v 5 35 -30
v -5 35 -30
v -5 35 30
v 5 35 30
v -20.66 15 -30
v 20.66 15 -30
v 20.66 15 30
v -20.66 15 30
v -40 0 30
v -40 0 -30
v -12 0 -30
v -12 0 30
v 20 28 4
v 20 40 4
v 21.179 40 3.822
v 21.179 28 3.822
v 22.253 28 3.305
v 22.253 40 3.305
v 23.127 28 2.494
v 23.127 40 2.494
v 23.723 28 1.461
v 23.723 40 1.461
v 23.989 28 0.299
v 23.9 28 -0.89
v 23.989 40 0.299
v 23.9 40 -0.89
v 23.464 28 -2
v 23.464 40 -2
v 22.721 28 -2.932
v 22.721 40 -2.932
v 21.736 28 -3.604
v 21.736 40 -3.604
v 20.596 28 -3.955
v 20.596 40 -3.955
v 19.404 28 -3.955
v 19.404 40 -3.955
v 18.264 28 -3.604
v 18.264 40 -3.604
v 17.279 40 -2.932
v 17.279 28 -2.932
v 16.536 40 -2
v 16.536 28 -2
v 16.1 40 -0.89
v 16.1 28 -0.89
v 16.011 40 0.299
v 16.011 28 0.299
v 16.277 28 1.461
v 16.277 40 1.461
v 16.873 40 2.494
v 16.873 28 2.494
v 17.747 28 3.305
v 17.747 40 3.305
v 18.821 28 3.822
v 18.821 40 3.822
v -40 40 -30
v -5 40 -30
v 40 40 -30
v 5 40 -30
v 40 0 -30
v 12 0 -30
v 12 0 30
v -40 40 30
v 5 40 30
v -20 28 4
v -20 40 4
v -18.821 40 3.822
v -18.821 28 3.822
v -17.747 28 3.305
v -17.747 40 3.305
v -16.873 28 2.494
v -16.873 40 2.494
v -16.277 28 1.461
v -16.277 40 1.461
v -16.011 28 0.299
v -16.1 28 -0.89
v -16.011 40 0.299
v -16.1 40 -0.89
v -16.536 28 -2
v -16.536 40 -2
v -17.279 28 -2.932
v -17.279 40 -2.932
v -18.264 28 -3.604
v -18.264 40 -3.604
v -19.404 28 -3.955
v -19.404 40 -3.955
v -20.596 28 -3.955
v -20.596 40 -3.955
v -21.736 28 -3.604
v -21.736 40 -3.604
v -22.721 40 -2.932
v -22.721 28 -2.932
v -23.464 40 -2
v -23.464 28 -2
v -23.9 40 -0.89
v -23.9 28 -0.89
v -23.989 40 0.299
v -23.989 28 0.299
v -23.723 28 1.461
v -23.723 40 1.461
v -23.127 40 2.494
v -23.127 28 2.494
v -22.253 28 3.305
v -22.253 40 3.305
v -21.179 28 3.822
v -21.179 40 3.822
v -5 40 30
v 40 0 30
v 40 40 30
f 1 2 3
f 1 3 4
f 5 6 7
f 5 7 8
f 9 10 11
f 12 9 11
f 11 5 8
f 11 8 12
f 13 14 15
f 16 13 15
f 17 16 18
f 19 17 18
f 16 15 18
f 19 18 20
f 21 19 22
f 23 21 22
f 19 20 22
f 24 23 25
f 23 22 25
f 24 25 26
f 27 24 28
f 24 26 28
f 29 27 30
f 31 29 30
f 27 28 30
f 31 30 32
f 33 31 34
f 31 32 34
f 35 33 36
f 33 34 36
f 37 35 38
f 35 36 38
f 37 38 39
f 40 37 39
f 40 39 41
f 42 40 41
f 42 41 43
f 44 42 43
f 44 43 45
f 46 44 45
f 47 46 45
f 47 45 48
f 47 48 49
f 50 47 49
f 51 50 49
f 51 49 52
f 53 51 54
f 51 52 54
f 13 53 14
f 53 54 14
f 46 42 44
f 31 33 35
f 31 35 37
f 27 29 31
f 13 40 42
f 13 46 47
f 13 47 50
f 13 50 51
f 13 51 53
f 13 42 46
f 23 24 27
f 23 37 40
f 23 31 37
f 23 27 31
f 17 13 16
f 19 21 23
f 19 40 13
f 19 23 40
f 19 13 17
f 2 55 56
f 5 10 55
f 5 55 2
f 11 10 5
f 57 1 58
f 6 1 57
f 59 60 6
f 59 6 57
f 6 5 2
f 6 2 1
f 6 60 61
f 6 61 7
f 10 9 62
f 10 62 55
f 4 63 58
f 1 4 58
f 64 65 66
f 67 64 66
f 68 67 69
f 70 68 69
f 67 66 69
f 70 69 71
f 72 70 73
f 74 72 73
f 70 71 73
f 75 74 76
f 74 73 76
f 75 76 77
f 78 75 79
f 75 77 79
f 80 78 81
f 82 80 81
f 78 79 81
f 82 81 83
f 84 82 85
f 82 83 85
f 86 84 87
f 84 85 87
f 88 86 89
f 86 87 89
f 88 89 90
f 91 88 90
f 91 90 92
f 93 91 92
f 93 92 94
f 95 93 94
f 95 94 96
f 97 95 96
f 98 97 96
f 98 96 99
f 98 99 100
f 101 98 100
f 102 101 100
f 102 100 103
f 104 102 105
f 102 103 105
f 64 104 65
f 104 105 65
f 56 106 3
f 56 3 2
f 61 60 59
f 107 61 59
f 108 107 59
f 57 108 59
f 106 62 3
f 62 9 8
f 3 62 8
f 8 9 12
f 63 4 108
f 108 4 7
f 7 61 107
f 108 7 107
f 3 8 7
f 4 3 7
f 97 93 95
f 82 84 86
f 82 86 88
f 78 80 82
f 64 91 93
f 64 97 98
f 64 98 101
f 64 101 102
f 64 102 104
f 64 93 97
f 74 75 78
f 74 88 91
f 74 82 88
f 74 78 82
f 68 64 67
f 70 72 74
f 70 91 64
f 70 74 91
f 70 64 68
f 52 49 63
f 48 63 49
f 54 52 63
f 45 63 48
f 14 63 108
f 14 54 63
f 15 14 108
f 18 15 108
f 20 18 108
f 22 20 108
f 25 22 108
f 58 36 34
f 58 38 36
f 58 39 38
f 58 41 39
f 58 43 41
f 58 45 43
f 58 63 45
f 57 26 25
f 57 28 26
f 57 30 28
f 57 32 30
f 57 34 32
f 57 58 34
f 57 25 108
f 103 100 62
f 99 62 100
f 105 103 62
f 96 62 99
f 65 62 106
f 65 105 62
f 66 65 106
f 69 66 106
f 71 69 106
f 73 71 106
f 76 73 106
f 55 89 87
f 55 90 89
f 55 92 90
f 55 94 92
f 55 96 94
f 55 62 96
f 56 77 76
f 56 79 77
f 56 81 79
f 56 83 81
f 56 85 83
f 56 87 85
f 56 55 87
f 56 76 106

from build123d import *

# Parameters (mm, degrees)
SKETCH_1_W          = 80
SKETCH_1_H          = 60
EXTRUDE_1_DEPTH     = 40
CUT_EXTRUDE_1_DEPTH = 65.031242374
CUT_EXTRUDE_2_DEPTH = 65.031242374
SKETCH_4_W          = 10
SKETCH_4_H          = 60
CUT_EXTRUDE_3_DEPTH = 5
SKETCH_5_R          = 4
CUT_EXTRUDE_4_DEPTH = 12


with BuildPart() as part:
    # 草图1 → 凸台-拉伸1 (new body)
    with BuildSketch(Plane(origin=(0, 0, 0), x_dir=(1, 0, 0), z_dir=(0, 1, 0))):
        Rectangle(SKETCH_1_W, SKETCH_1_H)
    extrude(amount=EXTRUDE_1_DEPTH)

    # 草图2 → 切除-拉伸1 (cut, through all)
    with BuildSketch(Plane.XY):
        Polygon((-12, 0), (12, 0), (20.6603, 15), (-20.6603, 15), align=None)
    extrude(amount=CUT_EXTRUDE_1_DEPTH, mode=Mode.SUBTRACT)

    # 草图3 → 切除-拉伸2 (cut, through all)
    with BuildSketch(Plane.XY):
        Polygon((-12, 0), (12, 0), (20.6603, 15), (-20.6603, 15), align=None)
    extrude(amount=-CUT_EXTRUDE_2_DEPTH, mode=Mode.SUBTRACT)

    # 草图4 → 切除-拉伸3 (cut)
    with BuildSketch(Plane(origin=(0, 40, 0), x_dir=(1, 0, 0), z_dir=(0, 1, 0))):
        Rectangle(SKETCH_4_W, SKETCH_4_H)
    extrude(amount=-CUT_EXTRUDE_3_DEPTH, mode=Mode.SUBTRACT)

    # 草图5 → 切除-拉伸4 (cut)
    with BuildSketch(Plane(origin=(0, 40, 0), x_dir=(1, 0, 0), z_dir=(0, 1, 0))):
        with Locations(Location((-20, 0, 0), (0, 0, 270))):
            Circle(SKETCH_5_R)
        with Locations(Location((20, 0, 0), (0, 0, 270))):
            Circle(SKETCH_5_R)
    extrude(amount=-CUT_EXTRUDE_4_DEPTH, mode=Mode.SUBTRACT)


solid = part.part
